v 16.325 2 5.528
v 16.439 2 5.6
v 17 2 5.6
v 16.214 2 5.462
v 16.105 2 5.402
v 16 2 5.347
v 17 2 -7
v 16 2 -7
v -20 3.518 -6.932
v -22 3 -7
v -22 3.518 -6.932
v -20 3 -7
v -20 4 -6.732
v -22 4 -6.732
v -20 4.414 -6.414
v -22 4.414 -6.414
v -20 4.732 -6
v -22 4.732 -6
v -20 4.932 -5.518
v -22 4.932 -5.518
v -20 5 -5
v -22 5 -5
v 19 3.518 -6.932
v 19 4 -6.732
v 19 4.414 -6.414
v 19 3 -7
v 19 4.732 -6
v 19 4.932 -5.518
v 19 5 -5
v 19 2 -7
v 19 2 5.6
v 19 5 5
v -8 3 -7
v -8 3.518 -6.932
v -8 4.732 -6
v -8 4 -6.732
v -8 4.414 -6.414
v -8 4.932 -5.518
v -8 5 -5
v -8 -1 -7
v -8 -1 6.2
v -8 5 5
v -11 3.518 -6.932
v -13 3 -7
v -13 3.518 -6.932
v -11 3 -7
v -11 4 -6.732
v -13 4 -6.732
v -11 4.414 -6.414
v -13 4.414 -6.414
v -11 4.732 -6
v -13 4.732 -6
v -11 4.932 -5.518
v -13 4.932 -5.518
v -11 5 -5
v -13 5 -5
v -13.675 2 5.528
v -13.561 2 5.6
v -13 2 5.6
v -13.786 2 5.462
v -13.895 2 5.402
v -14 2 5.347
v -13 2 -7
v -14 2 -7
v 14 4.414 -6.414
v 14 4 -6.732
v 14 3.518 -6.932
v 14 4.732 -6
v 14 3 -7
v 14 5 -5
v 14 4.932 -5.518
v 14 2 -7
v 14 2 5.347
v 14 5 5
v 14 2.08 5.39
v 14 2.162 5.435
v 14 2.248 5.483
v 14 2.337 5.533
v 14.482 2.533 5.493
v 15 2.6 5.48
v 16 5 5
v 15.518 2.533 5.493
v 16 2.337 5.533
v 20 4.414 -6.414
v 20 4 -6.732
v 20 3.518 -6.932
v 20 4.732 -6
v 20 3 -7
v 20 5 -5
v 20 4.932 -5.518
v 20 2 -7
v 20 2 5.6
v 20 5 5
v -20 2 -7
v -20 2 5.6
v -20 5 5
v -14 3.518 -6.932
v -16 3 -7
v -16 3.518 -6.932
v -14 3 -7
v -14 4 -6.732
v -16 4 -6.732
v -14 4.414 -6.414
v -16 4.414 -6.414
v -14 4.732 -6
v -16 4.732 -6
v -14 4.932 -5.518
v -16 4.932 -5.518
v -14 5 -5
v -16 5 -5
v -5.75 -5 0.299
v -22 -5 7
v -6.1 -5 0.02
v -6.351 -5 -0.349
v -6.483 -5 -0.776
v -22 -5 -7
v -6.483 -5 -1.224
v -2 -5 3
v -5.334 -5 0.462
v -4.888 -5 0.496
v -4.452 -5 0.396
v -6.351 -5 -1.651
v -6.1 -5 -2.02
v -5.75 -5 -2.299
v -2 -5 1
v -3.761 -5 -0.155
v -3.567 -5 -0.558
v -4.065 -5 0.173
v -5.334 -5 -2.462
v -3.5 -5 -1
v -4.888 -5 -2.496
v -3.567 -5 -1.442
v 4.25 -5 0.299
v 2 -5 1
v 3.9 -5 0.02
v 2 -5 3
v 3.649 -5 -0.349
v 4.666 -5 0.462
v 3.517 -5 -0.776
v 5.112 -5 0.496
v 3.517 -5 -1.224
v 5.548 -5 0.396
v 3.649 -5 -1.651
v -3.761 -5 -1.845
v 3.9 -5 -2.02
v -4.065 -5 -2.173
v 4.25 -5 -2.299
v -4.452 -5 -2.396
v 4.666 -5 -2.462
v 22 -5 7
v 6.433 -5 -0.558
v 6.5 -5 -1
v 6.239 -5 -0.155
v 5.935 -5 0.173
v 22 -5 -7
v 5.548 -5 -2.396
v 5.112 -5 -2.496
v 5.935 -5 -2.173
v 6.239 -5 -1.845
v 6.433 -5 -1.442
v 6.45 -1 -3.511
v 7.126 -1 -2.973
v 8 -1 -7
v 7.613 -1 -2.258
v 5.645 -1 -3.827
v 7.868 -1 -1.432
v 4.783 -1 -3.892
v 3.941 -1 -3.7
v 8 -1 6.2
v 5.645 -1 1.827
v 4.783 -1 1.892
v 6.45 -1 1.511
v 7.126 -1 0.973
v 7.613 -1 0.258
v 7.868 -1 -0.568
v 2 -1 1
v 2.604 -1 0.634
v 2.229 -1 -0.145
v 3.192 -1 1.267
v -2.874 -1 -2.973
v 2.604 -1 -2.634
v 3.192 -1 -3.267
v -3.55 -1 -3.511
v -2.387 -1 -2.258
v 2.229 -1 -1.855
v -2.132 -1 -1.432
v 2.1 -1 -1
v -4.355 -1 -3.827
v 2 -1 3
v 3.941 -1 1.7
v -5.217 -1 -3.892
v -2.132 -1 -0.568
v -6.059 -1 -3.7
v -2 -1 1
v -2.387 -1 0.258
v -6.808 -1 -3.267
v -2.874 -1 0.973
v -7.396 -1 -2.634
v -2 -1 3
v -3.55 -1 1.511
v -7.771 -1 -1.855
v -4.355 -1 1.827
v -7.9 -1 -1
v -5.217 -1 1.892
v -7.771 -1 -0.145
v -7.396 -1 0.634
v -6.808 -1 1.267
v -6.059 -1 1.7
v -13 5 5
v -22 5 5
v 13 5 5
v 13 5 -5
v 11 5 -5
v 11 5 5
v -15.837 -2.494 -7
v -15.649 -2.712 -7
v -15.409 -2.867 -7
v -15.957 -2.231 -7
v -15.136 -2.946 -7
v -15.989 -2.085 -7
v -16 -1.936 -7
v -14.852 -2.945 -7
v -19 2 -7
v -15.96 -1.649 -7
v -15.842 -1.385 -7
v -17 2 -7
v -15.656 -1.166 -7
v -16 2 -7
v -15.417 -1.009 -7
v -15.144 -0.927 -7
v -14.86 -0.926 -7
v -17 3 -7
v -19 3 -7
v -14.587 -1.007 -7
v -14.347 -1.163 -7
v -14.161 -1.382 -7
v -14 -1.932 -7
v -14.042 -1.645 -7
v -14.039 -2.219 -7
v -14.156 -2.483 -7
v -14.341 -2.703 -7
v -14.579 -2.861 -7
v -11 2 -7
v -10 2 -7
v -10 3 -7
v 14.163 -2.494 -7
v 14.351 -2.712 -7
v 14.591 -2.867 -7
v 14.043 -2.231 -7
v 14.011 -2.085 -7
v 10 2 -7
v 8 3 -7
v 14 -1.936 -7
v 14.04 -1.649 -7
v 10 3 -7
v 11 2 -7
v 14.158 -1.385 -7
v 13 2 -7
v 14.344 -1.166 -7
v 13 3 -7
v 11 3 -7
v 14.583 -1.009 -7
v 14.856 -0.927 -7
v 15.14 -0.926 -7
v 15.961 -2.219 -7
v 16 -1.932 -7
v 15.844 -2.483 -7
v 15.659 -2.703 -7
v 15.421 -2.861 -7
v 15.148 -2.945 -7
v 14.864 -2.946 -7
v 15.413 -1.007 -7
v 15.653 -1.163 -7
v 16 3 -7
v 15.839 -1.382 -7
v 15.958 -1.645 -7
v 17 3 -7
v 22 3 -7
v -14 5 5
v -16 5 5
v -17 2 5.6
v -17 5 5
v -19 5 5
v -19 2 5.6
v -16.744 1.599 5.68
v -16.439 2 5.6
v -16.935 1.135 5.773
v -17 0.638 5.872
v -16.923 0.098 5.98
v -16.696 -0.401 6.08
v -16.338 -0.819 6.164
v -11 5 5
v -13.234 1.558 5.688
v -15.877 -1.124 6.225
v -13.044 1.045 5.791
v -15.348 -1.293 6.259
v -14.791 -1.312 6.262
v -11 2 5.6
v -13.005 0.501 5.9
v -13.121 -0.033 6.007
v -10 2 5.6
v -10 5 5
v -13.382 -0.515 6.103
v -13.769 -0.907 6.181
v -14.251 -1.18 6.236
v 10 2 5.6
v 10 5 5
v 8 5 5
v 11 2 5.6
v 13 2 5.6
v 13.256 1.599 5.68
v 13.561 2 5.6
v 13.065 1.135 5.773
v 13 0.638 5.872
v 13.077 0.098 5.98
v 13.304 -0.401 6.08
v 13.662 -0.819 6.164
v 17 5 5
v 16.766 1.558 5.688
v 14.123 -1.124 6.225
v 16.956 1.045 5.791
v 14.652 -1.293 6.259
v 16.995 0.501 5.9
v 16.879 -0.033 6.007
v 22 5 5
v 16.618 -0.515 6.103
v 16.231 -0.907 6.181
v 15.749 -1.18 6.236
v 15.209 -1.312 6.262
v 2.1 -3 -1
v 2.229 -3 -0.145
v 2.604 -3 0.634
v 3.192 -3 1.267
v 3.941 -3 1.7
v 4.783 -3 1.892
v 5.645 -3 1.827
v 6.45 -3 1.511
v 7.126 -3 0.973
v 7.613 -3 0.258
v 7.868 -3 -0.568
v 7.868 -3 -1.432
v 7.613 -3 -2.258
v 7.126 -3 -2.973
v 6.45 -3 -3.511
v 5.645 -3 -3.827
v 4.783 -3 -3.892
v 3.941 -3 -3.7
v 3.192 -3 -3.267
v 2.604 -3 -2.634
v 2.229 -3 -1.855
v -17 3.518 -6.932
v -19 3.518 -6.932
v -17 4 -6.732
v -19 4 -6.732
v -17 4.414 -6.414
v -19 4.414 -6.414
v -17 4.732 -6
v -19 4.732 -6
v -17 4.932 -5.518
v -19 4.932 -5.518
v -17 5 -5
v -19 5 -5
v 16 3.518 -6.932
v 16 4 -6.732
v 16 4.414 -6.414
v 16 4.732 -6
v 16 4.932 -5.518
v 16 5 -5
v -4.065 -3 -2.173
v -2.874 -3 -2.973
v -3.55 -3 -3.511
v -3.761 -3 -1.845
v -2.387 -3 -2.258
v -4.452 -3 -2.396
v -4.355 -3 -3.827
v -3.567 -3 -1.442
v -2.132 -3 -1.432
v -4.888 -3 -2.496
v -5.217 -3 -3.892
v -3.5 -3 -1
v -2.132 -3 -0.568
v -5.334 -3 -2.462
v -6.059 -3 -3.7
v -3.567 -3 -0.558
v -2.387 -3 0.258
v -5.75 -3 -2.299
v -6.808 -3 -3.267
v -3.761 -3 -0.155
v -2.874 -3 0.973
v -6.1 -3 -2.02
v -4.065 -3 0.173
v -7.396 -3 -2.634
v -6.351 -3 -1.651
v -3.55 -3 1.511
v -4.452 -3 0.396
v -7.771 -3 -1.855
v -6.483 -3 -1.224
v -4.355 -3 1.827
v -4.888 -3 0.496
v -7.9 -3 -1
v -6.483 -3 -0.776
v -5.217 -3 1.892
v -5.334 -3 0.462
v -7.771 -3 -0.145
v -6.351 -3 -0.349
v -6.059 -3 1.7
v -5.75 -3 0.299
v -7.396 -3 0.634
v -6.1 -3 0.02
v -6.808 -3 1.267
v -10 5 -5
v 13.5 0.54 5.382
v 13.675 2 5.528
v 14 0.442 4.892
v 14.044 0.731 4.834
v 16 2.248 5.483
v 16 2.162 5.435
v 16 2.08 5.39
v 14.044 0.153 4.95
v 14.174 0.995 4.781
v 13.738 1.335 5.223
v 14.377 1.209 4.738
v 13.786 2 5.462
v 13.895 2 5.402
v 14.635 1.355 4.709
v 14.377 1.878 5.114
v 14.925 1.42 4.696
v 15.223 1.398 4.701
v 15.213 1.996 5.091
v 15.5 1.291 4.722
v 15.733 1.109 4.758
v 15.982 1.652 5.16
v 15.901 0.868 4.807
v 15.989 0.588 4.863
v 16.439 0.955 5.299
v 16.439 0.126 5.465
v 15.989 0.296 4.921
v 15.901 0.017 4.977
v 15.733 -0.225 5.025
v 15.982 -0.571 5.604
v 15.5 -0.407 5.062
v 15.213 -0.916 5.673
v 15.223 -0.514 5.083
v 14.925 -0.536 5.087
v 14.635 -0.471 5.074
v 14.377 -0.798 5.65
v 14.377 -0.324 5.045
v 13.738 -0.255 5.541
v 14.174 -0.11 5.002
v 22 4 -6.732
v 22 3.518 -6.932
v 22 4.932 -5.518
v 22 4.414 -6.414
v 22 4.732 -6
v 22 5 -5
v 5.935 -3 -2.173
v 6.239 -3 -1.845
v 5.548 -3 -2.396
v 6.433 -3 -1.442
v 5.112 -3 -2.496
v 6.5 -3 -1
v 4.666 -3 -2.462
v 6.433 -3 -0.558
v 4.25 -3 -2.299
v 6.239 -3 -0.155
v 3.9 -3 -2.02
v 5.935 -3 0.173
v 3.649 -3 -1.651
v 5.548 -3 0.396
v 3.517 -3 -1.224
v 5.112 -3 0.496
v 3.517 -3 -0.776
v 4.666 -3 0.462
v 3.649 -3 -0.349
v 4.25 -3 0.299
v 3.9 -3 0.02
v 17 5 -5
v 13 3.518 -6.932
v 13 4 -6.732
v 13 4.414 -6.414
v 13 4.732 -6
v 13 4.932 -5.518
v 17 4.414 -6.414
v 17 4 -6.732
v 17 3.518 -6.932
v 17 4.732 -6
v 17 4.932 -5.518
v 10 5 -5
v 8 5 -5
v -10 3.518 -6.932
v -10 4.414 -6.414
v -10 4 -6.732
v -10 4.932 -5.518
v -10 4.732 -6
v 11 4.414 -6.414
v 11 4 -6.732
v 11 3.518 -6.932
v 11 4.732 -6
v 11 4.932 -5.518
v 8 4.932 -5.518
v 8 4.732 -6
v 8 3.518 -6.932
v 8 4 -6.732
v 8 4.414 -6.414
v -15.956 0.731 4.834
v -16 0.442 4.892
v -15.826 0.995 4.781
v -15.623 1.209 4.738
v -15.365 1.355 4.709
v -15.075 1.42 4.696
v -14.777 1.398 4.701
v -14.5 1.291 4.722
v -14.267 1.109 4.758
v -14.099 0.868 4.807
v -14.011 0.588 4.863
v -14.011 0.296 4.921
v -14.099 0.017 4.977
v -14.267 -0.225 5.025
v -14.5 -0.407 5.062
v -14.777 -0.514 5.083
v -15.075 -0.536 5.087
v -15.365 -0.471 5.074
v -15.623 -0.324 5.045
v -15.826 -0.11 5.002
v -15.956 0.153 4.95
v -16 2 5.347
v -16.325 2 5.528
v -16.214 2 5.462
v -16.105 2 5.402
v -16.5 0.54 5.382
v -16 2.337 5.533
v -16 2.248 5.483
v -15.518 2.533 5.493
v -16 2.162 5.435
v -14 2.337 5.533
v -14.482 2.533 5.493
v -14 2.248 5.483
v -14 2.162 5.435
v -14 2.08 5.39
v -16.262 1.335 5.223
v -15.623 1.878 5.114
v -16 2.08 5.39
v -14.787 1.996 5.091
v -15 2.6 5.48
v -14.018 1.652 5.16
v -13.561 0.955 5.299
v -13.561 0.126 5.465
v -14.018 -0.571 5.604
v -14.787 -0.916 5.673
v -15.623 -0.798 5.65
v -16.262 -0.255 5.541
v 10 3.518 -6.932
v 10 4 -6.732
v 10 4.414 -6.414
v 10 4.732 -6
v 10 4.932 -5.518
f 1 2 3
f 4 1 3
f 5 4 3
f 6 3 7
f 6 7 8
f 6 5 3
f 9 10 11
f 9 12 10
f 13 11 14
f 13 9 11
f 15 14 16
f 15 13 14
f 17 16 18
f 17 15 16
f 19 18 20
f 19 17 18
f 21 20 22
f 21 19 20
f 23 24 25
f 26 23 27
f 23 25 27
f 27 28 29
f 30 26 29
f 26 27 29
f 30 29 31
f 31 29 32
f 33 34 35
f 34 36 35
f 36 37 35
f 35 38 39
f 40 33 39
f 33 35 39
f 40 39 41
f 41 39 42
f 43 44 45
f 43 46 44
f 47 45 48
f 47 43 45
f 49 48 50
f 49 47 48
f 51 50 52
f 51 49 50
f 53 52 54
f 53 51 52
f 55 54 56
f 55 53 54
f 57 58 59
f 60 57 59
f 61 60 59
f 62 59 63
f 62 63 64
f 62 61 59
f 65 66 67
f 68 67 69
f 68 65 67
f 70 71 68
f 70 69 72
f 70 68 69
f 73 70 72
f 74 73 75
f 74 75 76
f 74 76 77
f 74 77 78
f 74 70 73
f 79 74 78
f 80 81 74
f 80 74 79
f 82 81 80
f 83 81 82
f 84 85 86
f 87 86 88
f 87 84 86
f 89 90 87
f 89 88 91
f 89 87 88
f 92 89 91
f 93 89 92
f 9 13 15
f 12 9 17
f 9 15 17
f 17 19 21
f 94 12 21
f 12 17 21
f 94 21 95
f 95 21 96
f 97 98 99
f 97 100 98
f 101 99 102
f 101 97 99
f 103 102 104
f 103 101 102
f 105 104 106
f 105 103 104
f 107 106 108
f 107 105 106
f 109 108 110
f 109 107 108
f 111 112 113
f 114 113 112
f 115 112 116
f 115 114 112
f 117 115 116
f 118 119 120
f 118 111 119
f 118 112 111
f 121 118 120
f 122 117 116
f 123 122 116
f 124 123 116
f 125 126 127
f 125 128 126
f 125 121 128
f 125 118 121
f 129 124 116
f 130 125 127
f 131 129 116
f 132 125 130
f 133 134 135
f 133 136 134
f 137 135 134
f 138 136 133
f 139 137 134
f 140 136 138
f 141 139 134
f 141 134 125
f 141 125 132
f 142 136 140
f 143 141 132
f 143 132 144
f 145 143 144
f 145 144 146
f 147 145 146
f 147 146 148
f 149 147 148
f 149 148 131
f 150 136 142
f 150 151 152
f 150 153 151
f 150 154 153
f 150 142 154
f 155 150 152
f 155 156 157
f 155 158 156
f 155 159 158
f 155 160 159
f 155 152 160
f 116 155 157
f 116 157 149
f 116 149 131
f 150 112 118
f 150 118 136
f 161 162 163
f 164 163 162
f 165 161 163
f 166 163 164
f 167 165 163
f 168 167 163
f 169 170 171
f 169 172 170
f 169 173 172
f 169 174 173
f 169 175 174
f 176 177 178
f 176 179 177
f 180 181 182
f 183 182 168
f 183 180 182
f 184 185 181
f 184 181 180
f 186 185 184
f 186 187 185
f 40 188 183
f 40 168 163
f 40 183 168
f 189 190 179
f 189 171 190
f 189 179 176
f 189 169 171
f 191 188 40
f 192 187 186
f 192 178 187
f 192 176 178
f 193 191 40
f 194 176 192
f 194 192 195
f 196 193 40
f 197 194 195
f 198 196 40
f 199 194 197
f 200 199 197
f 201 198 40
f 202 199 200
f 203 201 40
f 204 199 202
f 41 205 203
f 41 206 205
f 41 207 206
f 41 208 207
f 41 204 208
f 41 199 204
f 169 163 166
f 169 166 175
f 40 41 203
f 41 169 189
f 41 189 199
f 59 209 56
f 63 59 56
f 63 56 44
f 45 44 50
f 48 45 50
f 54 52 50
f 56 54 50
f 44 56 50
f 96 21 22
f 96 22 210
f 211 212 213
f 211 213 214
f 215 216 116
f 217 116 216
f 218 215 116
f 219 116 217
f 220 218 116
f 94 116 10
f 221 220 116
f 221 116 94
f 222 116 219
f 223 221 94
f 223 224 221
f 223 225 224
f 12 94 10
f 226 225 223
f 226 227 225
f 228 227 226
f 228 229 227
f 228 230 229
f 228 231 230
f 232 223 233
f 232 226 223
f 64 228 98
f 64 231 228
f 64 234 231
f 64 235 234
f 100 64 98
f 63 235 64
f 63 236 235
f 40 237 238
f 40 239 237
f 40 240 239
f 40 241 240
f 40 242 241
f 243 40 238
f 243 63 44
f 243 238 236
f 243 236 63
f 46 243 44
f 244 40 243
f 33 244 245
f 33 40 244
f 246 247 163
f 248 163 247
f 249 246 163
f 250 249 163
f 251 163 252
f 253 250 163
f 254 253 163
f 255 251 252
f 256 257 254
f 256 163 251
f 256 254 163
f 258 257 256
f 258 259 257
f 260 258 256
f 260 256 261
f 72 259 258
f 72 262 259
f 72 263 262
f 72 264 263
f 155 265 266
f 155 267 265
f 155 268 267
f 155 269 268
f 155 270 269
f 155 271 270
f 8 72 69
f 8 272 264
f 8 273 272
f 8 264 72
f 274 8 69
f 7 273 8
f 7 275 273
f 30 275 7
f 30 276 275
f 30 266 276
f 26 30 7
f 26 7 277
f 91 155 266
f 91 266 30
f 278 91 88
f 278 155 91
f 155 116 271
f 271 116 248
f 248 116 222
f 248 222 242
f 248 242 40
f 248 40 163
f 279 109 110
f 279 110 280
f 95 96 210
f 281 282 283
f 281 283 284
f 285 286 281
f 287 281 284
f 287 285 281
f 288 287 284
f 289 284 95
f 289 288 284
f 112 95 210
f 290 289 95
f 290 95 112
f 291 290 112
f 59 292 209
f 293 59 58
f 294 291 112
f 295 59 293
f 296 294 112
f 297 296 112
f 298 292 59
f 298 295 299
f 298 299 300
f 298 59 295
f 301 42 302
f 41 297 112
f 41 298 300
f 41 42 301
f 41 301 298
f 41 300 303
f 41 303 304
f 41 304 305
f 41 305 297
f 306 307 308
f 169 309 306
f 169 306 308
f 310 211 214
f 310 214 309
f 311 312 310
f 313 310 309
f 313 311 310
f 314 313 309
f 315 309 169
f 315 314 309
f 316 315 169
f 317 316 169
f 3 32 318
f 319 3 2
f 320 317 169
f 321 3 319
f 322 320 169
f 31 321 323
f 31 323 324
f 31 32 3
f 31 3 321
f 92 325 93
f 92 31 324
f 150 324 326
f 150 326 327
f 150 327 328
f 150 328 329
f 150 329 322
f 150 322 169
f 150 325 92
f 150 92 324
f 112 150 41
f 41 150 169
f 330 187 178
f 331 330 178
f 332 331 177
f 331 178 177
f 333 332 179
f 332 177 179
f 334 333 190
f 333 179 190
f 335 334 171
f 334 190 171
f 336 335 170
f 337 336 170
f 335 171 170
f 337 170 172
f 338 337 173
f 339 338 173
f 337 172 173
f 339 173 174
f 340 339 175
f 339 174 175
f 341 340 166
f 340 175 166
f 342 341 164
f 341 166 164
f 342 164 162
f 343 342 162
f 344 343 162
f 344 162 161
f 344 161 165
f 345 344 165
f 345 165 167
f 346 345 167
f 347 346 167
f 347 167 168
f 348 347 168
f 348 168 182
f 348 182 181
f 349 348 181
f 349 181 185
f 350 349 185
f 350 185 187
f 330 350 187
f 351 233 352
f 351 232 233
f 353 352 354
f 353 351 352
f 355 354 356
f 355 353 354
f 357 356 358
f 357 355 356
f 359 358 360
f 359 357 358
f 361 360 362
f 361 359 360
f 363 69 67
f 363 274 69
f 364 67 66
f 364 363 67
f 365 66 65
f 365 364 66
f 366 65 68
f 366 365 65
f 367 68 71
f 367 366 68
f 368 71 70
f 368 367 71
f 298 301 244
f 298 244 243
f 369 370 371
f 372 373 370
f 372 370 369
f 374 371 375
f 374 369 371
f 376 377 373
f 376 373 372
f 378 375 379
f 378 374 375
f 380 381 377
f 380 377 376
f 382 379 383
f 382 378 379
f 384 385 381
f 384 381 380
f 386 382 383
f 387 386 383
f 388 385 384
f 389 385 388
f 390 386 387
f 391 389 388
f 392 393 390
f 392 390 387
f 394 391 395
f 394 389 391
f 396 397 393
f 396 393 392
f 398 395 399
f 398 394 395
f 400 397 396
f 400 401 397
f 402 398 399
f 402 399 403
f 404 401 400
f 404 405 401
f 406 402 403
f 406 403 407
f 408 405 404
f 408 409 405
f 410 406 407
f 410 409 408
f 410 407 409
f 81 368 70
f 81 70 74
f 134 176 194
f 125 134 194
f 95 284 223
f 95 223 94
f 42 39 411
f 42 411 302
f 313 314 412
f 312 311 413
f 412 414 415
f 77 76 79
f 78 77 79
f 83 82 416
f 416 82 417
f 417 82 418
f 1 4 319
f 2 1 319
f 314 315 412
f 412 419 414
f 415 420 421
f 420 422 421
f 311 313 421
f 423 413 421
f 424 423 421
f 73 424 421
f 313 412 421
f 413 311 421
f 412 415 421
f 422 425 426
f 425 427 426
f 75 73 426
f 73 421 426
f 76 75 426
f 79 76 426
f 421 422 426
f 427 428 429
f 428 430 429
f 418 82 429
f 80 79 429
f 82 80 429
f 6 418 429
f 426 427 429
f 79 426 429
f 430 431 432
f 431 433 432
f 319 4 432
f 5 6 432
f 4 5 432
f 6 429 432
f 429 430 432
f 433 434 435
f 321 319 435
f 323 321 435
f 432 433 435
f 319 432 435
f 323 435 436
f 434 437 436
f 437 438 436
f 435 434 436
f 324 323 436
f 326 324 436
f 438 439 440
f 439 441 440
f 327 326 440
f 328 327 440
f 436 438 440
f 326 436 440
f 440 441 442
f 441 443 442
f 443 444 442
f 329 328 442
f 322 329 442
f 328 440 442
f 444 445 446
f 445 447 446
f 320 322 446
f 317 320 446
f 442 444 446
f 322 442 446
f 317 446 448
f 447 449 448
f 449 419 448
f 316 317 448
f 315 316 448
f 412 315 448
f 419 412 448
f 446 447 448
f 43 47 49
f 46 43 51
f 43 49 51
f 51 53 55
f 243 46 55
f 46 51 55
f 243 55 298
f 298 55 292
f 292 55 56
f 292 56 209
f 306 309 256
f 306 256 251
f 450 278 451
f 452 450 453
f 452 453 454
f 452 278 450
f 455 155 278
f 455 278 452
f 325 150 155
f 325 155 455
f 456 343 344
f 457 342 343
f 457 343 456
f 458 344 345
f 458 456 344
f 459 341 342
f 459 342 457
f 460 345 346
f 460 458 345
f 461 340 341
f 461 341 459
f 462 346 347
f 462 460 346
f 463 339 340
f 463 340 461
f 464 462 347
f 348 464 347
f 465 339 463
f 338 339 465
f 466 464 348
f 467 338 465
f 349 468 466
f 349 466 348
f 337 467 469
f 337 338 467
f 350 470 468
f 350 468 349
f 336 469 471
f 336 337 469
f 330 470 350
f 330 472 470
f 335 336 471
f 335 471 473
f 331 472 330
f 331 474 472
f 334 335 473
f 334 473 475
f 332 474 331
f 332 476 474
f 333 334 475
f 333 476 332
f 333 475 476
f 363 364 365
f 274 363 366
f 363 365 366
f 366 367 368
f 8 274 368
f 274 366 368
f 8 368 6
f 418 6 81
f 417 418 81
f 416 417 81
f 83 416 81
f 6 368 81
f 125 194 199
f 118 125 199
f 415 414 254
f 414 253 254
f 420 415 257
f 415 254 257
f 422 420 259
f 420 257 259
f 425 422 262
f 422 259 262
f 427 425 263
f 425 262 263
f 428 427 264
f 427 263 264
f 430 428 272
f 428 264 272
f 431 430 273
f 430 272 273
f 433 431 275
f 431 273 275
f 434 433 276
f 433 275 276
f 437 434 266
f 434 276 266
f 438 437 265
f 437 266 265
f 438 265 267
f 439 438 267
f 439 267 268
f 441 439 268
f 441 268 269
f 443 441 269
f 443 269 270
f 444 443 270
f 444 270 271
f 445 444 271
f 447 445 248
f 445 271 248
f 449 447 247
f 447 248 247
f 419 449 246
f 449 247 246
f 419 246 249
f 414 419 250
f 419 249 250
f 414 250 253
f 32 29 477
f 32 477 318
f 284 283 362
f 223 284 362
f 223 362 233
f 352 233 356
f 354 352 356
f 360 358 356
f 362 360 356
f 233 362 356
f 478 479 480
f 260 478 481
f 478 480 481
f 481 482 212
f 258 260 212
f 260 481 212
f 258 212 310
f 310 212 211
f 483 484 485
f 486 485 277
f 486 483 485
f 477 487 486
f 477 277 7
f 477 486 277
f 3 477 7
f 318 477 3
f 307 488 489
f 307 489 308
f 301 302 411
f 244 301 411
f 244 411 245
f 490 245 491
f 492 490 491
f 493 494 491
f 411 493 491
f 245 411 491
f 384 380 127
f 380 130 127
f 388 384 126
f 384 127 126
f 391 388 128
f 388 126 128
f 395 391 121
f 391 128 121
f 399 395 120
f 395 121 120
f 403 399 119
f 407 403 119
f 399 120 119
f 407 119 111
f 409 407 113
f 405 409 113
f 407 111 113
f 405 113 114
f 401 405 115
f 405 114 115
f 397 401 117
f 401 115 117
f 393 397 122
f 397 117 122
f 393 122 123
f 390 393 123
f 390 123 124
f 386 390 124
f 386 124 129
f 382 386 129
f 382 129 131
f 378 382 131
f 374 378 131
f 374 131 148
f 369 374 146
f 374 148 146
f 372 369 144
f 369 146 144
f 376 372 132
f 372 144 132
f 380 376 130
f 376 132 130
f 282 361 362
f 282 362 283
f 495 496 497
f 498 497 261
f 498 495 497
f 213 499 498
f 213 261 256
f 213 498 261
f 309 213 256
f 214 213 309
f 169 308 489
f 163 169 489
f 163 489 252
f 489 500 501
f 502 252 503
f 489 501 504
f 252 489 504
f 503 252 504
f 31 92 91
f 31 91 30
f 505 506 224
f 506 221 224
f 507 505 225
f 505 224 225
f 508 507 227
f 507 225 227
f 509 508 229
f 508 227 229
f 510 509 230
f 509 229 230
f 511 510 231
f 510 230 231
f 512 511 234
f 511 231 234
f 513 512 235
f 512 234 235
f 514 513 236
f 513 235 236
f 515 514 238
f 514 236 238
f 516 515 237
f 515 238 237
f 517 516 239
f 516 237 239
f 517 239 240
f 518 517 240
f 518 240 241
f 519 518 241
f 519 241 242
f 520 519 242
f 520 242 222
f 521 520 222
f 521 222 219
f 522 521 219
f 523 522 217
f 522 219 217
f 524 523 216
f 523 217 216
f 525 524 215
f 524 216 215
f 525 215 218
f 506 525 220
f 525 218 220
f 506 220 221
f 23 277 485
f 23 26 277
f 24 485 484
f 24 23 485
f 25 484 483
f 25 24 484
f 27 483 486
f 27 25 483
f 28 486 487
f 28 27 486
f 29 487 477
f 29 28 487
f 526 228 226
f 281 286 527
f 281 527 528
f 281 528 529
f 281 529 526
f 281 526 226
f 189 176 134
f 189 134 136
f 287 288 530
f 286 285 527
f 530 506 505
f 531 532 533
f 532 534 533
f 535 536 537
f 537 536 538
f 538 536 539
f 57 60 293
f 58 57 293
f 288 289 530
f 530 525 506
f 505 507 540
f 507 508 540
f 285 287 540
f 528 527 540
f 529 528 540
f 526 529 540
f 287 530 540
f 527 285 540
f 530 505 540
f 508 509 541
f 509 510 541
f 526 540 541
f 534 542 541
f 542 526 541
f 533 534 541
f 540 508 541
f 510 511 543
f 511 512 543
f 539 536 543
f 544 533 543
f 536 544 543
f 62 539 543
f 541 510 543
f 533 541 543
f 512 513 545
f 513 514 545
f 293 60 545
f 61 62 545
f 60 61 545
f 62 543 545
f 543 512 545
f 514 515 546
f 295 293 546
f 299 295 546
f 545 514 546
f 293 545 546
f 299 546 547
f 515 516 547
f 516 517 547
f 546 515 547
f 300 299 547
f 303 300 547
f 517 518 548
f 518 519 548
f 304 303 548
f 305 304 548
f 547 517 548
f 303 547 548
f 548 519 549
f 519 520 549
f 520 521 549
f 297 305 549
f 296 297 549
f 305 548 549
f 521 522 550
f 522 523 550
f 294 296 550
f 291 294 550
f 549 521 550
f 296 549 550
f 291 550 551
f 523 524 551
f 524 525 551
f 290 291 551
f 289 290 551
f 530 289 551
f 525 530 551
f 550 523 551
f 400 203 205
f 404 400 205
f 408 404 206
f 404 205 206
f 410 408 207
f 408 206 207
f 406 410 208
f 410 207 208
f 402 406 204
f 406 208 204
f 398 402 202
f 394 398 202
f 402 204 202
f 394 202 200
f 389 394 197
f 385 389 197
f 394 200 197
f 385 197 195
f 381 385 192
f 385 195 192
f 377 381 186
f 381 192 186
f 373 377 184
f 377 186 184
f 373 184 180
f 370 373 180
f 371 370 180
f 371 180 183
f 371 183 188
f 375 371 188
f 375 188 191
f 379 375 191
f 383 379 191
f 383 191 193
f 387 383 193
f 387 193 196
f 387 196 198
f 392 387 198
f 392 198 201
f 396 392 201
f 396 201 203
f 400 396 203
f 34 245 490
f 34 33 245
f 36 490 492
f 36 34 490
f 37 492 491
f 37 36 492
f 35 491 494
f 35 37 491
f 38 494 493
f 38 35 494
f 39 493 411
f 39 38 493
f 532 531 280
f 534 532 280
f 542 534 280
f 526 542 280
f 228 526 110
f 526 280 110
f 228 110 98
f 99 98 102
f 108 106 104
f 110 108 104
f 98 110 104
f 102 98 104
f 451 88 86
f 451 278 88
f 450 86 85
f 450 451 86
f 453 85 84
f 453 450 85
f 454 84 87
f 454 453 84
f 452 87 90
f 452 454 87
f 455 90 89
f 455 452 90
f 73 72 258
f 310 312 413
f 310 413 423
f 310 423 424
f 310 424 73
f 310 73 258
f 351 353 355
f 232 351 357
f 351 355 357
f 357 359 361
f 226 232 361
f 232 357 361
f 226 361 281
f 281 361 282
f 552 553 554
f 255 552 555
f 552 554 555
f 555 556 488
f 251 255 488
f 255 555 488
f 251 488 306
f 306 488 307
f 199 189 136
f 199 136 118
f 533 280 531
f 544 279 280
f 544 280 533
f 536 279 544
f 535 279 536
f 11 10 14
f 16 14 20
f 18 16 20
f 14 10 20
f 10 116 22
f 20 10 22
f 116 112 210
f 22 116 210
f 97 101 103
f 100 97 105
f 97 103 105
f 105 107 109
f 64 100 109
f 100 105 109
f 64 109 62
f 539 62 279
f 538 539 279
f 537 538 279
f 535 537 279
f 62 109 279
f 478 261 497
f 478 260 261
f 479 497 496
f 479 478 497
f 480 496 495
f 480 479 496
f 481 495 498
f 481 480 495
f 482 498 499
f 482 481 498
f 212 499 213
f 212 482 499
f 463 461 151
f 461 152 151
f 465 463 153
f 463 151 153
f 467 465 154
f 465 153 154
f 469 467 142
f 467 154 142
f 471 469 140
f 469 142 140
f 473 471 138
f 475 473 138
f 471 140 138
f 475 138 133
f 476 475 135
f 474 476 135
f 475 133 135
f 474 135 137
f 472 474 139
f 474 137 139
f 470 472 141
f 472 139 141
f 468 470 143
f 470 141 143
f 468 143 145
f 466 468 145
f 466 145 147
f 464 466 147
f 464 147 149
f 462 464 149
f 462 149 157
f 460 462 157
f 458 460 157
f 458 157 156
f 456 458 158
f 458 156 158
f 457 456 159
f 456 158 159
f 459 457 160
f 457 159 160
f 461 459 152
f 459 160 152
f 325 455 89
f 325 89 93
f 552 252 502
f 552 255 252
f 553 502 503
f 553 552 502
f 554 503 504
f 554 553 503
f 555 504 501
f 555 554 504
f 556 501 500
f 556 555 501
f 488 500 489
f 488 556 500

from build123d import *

# Parameters (mm, degrees)
F1_DEPTH        = 22
F2_W            = 16
F2_H            = 12
F2_H_2          = 2
F3_DEPTH        = 6
F4_W            = 1
F4_H            = 14
F4_H_2          = 12
F4_H_3          = 2
F5_DEPTH        = 3
F6_R            = 2
F8_D            = 2
F8_DEPTH        = 15
F8_CSINK_D      = 4
F8_CSINK_ANGLE  = 90
F8_TIP          = 0.600860619
F9_W            = 4
F9_H            = 2
F10_DEPTH       = 25
F11_D           = 3
F11_DEPTH       = 15
F11_CBORE_D     = 5.8
F11_CBORE_DEPTH = 2
F11_TIP         = 0.9012909285


with BuildPart() as f1:
    # F0 (on Right) → F1 (new body, symmetric)
    with BuildSketch(Plane.YZ):
        Polygon((-5, -7), (5, -7), (5, 5), (-5, 7), align=None)
    extrude(amount=F1_DEPTH, both=True)

    # F2 (on face) → F3 (cut)
    with BuildSketch(Plane(origin=(0, 5, 0), x_dir=(-1, 0, 0), z_dir=(0, 1, 0))):
        with Locations((0, -1)):
            Rectangle(F2_W, F2_H)
        with Locations((0, 6)):
            Rectangle(F2_W, F2_H_2)
    extrude(amount=-F3_DEPTH, mode=Mode.SUBTRACT)

    # F4 (on face) → F5 (cut)
    with BuildSketch(Plane(origin=(0, 5, 0), x_dir=(-1, 0, 0), z_dir=(0, 1, 0))):
        with Locations((-10.5, 0)):
            Rectangle(F4_W, F4_H)
        with Locations((-13.5, 0)):
            Rectangle(F4_W, F4_H)
        with Locations((-16.5, 0)):
            Rectangle(F4_W, F4_H)
        with Locations((-19.5, 0)):
            Rectangle(F4_W, F4_H)
        with Locations((10.5, -1)):
            Rectangle(F4_W, F4_H_2)
        with Locations((13.5, -1)):
            Rectangle(F4_W, F4_H_2)
        with Locations((16.5, -1)):
            Rectangle(F4_W, F4_H_2)
        with Locations((19.5, -1)):
            Rectangle(F4_W, F4_H_2)
        with Locations((19.5, 6)):
            Rectangle(F4_W, F4_H_3)
        with Locations((16.5, 6)):
            Rectangle(F4_W, F4_H_3)
        with Locations((13.5, 6)):
            Rectangle(F4_W, F4_H_3)
        with Locations((10.5, 6)):
            Rectangle(F4_W, F4_H_3)
    extrude(amount=-F5_DEPTH, mode=Mode.SUBTRACT)

    # F6
    f6_edges = [f1.edges().sort_by_distance(p)[0] for p in [
        (21, 5, -7),
        (18, 5, -7),
        (15, 5, -7),
        (12, 5, -7),
        (9, 5, -7),
        (-9, 5, -7),
        (-12, 5, -7),
        (-15, 5, -7),
        (-18, 5, -7),
        (-21, 5, -7),
    ]]
    fillet(f6_edges, radius=F6_R)

    # F8
    with Locations(Plane(origin=(0, 1.1538461538, 5.7692307692), x_dir=(1, 0, 0), z_dir=(0, 0.1961161351, 0.9805806757))):
        with Locations((15, -0.5257163244), (-15, -0.5257163244)):
            CounterSinkHole(F8_D / 2, F8_CSINK_D / 2, depth=F8_DEPTH, counter_sink_angle=F8_CSINK_ANGLE)
            with Locations((0, 0, -(F8_DEPTH + F8_TIP / 2))):  # 118° drill point
                Cone(0, F8_D / 2, F8_TIP, mode=Mode.SUBTRACT)

    # F9 (on face) → F10 (cut)
    with BuildSketch(Plane(origin=(0, -1, 0), x_dir=(-1, 0, 0), z_dir=(0, 1, 0))):
        with Locations((0, 2)):
            Rectangle(F9_W, F9_H)
    extrude(amount=-F10_DEPTH, mode=Mode.SUBTRACT)

    # F11
    with Locations(Plane(origin=(0, -1, 0), x_dir=(-1, 0, 0), z_dir=(0, 1, 0))):
        with Locations((-5, -1), (5, -1)):
            CounterBoreHole(F11_D / 2, F11_CBORE_D / 2, F11_CBORE_DEPTH, depth=F11_DEPTH)
            with Locations((0, 0, -(F11_DEPTH + F11_TIP / 2))):  # 118° drill point
                Cone(0, F11_D / 2, F11_TIP, mode=Mode.SUBTRACT)


solid = f1.part
